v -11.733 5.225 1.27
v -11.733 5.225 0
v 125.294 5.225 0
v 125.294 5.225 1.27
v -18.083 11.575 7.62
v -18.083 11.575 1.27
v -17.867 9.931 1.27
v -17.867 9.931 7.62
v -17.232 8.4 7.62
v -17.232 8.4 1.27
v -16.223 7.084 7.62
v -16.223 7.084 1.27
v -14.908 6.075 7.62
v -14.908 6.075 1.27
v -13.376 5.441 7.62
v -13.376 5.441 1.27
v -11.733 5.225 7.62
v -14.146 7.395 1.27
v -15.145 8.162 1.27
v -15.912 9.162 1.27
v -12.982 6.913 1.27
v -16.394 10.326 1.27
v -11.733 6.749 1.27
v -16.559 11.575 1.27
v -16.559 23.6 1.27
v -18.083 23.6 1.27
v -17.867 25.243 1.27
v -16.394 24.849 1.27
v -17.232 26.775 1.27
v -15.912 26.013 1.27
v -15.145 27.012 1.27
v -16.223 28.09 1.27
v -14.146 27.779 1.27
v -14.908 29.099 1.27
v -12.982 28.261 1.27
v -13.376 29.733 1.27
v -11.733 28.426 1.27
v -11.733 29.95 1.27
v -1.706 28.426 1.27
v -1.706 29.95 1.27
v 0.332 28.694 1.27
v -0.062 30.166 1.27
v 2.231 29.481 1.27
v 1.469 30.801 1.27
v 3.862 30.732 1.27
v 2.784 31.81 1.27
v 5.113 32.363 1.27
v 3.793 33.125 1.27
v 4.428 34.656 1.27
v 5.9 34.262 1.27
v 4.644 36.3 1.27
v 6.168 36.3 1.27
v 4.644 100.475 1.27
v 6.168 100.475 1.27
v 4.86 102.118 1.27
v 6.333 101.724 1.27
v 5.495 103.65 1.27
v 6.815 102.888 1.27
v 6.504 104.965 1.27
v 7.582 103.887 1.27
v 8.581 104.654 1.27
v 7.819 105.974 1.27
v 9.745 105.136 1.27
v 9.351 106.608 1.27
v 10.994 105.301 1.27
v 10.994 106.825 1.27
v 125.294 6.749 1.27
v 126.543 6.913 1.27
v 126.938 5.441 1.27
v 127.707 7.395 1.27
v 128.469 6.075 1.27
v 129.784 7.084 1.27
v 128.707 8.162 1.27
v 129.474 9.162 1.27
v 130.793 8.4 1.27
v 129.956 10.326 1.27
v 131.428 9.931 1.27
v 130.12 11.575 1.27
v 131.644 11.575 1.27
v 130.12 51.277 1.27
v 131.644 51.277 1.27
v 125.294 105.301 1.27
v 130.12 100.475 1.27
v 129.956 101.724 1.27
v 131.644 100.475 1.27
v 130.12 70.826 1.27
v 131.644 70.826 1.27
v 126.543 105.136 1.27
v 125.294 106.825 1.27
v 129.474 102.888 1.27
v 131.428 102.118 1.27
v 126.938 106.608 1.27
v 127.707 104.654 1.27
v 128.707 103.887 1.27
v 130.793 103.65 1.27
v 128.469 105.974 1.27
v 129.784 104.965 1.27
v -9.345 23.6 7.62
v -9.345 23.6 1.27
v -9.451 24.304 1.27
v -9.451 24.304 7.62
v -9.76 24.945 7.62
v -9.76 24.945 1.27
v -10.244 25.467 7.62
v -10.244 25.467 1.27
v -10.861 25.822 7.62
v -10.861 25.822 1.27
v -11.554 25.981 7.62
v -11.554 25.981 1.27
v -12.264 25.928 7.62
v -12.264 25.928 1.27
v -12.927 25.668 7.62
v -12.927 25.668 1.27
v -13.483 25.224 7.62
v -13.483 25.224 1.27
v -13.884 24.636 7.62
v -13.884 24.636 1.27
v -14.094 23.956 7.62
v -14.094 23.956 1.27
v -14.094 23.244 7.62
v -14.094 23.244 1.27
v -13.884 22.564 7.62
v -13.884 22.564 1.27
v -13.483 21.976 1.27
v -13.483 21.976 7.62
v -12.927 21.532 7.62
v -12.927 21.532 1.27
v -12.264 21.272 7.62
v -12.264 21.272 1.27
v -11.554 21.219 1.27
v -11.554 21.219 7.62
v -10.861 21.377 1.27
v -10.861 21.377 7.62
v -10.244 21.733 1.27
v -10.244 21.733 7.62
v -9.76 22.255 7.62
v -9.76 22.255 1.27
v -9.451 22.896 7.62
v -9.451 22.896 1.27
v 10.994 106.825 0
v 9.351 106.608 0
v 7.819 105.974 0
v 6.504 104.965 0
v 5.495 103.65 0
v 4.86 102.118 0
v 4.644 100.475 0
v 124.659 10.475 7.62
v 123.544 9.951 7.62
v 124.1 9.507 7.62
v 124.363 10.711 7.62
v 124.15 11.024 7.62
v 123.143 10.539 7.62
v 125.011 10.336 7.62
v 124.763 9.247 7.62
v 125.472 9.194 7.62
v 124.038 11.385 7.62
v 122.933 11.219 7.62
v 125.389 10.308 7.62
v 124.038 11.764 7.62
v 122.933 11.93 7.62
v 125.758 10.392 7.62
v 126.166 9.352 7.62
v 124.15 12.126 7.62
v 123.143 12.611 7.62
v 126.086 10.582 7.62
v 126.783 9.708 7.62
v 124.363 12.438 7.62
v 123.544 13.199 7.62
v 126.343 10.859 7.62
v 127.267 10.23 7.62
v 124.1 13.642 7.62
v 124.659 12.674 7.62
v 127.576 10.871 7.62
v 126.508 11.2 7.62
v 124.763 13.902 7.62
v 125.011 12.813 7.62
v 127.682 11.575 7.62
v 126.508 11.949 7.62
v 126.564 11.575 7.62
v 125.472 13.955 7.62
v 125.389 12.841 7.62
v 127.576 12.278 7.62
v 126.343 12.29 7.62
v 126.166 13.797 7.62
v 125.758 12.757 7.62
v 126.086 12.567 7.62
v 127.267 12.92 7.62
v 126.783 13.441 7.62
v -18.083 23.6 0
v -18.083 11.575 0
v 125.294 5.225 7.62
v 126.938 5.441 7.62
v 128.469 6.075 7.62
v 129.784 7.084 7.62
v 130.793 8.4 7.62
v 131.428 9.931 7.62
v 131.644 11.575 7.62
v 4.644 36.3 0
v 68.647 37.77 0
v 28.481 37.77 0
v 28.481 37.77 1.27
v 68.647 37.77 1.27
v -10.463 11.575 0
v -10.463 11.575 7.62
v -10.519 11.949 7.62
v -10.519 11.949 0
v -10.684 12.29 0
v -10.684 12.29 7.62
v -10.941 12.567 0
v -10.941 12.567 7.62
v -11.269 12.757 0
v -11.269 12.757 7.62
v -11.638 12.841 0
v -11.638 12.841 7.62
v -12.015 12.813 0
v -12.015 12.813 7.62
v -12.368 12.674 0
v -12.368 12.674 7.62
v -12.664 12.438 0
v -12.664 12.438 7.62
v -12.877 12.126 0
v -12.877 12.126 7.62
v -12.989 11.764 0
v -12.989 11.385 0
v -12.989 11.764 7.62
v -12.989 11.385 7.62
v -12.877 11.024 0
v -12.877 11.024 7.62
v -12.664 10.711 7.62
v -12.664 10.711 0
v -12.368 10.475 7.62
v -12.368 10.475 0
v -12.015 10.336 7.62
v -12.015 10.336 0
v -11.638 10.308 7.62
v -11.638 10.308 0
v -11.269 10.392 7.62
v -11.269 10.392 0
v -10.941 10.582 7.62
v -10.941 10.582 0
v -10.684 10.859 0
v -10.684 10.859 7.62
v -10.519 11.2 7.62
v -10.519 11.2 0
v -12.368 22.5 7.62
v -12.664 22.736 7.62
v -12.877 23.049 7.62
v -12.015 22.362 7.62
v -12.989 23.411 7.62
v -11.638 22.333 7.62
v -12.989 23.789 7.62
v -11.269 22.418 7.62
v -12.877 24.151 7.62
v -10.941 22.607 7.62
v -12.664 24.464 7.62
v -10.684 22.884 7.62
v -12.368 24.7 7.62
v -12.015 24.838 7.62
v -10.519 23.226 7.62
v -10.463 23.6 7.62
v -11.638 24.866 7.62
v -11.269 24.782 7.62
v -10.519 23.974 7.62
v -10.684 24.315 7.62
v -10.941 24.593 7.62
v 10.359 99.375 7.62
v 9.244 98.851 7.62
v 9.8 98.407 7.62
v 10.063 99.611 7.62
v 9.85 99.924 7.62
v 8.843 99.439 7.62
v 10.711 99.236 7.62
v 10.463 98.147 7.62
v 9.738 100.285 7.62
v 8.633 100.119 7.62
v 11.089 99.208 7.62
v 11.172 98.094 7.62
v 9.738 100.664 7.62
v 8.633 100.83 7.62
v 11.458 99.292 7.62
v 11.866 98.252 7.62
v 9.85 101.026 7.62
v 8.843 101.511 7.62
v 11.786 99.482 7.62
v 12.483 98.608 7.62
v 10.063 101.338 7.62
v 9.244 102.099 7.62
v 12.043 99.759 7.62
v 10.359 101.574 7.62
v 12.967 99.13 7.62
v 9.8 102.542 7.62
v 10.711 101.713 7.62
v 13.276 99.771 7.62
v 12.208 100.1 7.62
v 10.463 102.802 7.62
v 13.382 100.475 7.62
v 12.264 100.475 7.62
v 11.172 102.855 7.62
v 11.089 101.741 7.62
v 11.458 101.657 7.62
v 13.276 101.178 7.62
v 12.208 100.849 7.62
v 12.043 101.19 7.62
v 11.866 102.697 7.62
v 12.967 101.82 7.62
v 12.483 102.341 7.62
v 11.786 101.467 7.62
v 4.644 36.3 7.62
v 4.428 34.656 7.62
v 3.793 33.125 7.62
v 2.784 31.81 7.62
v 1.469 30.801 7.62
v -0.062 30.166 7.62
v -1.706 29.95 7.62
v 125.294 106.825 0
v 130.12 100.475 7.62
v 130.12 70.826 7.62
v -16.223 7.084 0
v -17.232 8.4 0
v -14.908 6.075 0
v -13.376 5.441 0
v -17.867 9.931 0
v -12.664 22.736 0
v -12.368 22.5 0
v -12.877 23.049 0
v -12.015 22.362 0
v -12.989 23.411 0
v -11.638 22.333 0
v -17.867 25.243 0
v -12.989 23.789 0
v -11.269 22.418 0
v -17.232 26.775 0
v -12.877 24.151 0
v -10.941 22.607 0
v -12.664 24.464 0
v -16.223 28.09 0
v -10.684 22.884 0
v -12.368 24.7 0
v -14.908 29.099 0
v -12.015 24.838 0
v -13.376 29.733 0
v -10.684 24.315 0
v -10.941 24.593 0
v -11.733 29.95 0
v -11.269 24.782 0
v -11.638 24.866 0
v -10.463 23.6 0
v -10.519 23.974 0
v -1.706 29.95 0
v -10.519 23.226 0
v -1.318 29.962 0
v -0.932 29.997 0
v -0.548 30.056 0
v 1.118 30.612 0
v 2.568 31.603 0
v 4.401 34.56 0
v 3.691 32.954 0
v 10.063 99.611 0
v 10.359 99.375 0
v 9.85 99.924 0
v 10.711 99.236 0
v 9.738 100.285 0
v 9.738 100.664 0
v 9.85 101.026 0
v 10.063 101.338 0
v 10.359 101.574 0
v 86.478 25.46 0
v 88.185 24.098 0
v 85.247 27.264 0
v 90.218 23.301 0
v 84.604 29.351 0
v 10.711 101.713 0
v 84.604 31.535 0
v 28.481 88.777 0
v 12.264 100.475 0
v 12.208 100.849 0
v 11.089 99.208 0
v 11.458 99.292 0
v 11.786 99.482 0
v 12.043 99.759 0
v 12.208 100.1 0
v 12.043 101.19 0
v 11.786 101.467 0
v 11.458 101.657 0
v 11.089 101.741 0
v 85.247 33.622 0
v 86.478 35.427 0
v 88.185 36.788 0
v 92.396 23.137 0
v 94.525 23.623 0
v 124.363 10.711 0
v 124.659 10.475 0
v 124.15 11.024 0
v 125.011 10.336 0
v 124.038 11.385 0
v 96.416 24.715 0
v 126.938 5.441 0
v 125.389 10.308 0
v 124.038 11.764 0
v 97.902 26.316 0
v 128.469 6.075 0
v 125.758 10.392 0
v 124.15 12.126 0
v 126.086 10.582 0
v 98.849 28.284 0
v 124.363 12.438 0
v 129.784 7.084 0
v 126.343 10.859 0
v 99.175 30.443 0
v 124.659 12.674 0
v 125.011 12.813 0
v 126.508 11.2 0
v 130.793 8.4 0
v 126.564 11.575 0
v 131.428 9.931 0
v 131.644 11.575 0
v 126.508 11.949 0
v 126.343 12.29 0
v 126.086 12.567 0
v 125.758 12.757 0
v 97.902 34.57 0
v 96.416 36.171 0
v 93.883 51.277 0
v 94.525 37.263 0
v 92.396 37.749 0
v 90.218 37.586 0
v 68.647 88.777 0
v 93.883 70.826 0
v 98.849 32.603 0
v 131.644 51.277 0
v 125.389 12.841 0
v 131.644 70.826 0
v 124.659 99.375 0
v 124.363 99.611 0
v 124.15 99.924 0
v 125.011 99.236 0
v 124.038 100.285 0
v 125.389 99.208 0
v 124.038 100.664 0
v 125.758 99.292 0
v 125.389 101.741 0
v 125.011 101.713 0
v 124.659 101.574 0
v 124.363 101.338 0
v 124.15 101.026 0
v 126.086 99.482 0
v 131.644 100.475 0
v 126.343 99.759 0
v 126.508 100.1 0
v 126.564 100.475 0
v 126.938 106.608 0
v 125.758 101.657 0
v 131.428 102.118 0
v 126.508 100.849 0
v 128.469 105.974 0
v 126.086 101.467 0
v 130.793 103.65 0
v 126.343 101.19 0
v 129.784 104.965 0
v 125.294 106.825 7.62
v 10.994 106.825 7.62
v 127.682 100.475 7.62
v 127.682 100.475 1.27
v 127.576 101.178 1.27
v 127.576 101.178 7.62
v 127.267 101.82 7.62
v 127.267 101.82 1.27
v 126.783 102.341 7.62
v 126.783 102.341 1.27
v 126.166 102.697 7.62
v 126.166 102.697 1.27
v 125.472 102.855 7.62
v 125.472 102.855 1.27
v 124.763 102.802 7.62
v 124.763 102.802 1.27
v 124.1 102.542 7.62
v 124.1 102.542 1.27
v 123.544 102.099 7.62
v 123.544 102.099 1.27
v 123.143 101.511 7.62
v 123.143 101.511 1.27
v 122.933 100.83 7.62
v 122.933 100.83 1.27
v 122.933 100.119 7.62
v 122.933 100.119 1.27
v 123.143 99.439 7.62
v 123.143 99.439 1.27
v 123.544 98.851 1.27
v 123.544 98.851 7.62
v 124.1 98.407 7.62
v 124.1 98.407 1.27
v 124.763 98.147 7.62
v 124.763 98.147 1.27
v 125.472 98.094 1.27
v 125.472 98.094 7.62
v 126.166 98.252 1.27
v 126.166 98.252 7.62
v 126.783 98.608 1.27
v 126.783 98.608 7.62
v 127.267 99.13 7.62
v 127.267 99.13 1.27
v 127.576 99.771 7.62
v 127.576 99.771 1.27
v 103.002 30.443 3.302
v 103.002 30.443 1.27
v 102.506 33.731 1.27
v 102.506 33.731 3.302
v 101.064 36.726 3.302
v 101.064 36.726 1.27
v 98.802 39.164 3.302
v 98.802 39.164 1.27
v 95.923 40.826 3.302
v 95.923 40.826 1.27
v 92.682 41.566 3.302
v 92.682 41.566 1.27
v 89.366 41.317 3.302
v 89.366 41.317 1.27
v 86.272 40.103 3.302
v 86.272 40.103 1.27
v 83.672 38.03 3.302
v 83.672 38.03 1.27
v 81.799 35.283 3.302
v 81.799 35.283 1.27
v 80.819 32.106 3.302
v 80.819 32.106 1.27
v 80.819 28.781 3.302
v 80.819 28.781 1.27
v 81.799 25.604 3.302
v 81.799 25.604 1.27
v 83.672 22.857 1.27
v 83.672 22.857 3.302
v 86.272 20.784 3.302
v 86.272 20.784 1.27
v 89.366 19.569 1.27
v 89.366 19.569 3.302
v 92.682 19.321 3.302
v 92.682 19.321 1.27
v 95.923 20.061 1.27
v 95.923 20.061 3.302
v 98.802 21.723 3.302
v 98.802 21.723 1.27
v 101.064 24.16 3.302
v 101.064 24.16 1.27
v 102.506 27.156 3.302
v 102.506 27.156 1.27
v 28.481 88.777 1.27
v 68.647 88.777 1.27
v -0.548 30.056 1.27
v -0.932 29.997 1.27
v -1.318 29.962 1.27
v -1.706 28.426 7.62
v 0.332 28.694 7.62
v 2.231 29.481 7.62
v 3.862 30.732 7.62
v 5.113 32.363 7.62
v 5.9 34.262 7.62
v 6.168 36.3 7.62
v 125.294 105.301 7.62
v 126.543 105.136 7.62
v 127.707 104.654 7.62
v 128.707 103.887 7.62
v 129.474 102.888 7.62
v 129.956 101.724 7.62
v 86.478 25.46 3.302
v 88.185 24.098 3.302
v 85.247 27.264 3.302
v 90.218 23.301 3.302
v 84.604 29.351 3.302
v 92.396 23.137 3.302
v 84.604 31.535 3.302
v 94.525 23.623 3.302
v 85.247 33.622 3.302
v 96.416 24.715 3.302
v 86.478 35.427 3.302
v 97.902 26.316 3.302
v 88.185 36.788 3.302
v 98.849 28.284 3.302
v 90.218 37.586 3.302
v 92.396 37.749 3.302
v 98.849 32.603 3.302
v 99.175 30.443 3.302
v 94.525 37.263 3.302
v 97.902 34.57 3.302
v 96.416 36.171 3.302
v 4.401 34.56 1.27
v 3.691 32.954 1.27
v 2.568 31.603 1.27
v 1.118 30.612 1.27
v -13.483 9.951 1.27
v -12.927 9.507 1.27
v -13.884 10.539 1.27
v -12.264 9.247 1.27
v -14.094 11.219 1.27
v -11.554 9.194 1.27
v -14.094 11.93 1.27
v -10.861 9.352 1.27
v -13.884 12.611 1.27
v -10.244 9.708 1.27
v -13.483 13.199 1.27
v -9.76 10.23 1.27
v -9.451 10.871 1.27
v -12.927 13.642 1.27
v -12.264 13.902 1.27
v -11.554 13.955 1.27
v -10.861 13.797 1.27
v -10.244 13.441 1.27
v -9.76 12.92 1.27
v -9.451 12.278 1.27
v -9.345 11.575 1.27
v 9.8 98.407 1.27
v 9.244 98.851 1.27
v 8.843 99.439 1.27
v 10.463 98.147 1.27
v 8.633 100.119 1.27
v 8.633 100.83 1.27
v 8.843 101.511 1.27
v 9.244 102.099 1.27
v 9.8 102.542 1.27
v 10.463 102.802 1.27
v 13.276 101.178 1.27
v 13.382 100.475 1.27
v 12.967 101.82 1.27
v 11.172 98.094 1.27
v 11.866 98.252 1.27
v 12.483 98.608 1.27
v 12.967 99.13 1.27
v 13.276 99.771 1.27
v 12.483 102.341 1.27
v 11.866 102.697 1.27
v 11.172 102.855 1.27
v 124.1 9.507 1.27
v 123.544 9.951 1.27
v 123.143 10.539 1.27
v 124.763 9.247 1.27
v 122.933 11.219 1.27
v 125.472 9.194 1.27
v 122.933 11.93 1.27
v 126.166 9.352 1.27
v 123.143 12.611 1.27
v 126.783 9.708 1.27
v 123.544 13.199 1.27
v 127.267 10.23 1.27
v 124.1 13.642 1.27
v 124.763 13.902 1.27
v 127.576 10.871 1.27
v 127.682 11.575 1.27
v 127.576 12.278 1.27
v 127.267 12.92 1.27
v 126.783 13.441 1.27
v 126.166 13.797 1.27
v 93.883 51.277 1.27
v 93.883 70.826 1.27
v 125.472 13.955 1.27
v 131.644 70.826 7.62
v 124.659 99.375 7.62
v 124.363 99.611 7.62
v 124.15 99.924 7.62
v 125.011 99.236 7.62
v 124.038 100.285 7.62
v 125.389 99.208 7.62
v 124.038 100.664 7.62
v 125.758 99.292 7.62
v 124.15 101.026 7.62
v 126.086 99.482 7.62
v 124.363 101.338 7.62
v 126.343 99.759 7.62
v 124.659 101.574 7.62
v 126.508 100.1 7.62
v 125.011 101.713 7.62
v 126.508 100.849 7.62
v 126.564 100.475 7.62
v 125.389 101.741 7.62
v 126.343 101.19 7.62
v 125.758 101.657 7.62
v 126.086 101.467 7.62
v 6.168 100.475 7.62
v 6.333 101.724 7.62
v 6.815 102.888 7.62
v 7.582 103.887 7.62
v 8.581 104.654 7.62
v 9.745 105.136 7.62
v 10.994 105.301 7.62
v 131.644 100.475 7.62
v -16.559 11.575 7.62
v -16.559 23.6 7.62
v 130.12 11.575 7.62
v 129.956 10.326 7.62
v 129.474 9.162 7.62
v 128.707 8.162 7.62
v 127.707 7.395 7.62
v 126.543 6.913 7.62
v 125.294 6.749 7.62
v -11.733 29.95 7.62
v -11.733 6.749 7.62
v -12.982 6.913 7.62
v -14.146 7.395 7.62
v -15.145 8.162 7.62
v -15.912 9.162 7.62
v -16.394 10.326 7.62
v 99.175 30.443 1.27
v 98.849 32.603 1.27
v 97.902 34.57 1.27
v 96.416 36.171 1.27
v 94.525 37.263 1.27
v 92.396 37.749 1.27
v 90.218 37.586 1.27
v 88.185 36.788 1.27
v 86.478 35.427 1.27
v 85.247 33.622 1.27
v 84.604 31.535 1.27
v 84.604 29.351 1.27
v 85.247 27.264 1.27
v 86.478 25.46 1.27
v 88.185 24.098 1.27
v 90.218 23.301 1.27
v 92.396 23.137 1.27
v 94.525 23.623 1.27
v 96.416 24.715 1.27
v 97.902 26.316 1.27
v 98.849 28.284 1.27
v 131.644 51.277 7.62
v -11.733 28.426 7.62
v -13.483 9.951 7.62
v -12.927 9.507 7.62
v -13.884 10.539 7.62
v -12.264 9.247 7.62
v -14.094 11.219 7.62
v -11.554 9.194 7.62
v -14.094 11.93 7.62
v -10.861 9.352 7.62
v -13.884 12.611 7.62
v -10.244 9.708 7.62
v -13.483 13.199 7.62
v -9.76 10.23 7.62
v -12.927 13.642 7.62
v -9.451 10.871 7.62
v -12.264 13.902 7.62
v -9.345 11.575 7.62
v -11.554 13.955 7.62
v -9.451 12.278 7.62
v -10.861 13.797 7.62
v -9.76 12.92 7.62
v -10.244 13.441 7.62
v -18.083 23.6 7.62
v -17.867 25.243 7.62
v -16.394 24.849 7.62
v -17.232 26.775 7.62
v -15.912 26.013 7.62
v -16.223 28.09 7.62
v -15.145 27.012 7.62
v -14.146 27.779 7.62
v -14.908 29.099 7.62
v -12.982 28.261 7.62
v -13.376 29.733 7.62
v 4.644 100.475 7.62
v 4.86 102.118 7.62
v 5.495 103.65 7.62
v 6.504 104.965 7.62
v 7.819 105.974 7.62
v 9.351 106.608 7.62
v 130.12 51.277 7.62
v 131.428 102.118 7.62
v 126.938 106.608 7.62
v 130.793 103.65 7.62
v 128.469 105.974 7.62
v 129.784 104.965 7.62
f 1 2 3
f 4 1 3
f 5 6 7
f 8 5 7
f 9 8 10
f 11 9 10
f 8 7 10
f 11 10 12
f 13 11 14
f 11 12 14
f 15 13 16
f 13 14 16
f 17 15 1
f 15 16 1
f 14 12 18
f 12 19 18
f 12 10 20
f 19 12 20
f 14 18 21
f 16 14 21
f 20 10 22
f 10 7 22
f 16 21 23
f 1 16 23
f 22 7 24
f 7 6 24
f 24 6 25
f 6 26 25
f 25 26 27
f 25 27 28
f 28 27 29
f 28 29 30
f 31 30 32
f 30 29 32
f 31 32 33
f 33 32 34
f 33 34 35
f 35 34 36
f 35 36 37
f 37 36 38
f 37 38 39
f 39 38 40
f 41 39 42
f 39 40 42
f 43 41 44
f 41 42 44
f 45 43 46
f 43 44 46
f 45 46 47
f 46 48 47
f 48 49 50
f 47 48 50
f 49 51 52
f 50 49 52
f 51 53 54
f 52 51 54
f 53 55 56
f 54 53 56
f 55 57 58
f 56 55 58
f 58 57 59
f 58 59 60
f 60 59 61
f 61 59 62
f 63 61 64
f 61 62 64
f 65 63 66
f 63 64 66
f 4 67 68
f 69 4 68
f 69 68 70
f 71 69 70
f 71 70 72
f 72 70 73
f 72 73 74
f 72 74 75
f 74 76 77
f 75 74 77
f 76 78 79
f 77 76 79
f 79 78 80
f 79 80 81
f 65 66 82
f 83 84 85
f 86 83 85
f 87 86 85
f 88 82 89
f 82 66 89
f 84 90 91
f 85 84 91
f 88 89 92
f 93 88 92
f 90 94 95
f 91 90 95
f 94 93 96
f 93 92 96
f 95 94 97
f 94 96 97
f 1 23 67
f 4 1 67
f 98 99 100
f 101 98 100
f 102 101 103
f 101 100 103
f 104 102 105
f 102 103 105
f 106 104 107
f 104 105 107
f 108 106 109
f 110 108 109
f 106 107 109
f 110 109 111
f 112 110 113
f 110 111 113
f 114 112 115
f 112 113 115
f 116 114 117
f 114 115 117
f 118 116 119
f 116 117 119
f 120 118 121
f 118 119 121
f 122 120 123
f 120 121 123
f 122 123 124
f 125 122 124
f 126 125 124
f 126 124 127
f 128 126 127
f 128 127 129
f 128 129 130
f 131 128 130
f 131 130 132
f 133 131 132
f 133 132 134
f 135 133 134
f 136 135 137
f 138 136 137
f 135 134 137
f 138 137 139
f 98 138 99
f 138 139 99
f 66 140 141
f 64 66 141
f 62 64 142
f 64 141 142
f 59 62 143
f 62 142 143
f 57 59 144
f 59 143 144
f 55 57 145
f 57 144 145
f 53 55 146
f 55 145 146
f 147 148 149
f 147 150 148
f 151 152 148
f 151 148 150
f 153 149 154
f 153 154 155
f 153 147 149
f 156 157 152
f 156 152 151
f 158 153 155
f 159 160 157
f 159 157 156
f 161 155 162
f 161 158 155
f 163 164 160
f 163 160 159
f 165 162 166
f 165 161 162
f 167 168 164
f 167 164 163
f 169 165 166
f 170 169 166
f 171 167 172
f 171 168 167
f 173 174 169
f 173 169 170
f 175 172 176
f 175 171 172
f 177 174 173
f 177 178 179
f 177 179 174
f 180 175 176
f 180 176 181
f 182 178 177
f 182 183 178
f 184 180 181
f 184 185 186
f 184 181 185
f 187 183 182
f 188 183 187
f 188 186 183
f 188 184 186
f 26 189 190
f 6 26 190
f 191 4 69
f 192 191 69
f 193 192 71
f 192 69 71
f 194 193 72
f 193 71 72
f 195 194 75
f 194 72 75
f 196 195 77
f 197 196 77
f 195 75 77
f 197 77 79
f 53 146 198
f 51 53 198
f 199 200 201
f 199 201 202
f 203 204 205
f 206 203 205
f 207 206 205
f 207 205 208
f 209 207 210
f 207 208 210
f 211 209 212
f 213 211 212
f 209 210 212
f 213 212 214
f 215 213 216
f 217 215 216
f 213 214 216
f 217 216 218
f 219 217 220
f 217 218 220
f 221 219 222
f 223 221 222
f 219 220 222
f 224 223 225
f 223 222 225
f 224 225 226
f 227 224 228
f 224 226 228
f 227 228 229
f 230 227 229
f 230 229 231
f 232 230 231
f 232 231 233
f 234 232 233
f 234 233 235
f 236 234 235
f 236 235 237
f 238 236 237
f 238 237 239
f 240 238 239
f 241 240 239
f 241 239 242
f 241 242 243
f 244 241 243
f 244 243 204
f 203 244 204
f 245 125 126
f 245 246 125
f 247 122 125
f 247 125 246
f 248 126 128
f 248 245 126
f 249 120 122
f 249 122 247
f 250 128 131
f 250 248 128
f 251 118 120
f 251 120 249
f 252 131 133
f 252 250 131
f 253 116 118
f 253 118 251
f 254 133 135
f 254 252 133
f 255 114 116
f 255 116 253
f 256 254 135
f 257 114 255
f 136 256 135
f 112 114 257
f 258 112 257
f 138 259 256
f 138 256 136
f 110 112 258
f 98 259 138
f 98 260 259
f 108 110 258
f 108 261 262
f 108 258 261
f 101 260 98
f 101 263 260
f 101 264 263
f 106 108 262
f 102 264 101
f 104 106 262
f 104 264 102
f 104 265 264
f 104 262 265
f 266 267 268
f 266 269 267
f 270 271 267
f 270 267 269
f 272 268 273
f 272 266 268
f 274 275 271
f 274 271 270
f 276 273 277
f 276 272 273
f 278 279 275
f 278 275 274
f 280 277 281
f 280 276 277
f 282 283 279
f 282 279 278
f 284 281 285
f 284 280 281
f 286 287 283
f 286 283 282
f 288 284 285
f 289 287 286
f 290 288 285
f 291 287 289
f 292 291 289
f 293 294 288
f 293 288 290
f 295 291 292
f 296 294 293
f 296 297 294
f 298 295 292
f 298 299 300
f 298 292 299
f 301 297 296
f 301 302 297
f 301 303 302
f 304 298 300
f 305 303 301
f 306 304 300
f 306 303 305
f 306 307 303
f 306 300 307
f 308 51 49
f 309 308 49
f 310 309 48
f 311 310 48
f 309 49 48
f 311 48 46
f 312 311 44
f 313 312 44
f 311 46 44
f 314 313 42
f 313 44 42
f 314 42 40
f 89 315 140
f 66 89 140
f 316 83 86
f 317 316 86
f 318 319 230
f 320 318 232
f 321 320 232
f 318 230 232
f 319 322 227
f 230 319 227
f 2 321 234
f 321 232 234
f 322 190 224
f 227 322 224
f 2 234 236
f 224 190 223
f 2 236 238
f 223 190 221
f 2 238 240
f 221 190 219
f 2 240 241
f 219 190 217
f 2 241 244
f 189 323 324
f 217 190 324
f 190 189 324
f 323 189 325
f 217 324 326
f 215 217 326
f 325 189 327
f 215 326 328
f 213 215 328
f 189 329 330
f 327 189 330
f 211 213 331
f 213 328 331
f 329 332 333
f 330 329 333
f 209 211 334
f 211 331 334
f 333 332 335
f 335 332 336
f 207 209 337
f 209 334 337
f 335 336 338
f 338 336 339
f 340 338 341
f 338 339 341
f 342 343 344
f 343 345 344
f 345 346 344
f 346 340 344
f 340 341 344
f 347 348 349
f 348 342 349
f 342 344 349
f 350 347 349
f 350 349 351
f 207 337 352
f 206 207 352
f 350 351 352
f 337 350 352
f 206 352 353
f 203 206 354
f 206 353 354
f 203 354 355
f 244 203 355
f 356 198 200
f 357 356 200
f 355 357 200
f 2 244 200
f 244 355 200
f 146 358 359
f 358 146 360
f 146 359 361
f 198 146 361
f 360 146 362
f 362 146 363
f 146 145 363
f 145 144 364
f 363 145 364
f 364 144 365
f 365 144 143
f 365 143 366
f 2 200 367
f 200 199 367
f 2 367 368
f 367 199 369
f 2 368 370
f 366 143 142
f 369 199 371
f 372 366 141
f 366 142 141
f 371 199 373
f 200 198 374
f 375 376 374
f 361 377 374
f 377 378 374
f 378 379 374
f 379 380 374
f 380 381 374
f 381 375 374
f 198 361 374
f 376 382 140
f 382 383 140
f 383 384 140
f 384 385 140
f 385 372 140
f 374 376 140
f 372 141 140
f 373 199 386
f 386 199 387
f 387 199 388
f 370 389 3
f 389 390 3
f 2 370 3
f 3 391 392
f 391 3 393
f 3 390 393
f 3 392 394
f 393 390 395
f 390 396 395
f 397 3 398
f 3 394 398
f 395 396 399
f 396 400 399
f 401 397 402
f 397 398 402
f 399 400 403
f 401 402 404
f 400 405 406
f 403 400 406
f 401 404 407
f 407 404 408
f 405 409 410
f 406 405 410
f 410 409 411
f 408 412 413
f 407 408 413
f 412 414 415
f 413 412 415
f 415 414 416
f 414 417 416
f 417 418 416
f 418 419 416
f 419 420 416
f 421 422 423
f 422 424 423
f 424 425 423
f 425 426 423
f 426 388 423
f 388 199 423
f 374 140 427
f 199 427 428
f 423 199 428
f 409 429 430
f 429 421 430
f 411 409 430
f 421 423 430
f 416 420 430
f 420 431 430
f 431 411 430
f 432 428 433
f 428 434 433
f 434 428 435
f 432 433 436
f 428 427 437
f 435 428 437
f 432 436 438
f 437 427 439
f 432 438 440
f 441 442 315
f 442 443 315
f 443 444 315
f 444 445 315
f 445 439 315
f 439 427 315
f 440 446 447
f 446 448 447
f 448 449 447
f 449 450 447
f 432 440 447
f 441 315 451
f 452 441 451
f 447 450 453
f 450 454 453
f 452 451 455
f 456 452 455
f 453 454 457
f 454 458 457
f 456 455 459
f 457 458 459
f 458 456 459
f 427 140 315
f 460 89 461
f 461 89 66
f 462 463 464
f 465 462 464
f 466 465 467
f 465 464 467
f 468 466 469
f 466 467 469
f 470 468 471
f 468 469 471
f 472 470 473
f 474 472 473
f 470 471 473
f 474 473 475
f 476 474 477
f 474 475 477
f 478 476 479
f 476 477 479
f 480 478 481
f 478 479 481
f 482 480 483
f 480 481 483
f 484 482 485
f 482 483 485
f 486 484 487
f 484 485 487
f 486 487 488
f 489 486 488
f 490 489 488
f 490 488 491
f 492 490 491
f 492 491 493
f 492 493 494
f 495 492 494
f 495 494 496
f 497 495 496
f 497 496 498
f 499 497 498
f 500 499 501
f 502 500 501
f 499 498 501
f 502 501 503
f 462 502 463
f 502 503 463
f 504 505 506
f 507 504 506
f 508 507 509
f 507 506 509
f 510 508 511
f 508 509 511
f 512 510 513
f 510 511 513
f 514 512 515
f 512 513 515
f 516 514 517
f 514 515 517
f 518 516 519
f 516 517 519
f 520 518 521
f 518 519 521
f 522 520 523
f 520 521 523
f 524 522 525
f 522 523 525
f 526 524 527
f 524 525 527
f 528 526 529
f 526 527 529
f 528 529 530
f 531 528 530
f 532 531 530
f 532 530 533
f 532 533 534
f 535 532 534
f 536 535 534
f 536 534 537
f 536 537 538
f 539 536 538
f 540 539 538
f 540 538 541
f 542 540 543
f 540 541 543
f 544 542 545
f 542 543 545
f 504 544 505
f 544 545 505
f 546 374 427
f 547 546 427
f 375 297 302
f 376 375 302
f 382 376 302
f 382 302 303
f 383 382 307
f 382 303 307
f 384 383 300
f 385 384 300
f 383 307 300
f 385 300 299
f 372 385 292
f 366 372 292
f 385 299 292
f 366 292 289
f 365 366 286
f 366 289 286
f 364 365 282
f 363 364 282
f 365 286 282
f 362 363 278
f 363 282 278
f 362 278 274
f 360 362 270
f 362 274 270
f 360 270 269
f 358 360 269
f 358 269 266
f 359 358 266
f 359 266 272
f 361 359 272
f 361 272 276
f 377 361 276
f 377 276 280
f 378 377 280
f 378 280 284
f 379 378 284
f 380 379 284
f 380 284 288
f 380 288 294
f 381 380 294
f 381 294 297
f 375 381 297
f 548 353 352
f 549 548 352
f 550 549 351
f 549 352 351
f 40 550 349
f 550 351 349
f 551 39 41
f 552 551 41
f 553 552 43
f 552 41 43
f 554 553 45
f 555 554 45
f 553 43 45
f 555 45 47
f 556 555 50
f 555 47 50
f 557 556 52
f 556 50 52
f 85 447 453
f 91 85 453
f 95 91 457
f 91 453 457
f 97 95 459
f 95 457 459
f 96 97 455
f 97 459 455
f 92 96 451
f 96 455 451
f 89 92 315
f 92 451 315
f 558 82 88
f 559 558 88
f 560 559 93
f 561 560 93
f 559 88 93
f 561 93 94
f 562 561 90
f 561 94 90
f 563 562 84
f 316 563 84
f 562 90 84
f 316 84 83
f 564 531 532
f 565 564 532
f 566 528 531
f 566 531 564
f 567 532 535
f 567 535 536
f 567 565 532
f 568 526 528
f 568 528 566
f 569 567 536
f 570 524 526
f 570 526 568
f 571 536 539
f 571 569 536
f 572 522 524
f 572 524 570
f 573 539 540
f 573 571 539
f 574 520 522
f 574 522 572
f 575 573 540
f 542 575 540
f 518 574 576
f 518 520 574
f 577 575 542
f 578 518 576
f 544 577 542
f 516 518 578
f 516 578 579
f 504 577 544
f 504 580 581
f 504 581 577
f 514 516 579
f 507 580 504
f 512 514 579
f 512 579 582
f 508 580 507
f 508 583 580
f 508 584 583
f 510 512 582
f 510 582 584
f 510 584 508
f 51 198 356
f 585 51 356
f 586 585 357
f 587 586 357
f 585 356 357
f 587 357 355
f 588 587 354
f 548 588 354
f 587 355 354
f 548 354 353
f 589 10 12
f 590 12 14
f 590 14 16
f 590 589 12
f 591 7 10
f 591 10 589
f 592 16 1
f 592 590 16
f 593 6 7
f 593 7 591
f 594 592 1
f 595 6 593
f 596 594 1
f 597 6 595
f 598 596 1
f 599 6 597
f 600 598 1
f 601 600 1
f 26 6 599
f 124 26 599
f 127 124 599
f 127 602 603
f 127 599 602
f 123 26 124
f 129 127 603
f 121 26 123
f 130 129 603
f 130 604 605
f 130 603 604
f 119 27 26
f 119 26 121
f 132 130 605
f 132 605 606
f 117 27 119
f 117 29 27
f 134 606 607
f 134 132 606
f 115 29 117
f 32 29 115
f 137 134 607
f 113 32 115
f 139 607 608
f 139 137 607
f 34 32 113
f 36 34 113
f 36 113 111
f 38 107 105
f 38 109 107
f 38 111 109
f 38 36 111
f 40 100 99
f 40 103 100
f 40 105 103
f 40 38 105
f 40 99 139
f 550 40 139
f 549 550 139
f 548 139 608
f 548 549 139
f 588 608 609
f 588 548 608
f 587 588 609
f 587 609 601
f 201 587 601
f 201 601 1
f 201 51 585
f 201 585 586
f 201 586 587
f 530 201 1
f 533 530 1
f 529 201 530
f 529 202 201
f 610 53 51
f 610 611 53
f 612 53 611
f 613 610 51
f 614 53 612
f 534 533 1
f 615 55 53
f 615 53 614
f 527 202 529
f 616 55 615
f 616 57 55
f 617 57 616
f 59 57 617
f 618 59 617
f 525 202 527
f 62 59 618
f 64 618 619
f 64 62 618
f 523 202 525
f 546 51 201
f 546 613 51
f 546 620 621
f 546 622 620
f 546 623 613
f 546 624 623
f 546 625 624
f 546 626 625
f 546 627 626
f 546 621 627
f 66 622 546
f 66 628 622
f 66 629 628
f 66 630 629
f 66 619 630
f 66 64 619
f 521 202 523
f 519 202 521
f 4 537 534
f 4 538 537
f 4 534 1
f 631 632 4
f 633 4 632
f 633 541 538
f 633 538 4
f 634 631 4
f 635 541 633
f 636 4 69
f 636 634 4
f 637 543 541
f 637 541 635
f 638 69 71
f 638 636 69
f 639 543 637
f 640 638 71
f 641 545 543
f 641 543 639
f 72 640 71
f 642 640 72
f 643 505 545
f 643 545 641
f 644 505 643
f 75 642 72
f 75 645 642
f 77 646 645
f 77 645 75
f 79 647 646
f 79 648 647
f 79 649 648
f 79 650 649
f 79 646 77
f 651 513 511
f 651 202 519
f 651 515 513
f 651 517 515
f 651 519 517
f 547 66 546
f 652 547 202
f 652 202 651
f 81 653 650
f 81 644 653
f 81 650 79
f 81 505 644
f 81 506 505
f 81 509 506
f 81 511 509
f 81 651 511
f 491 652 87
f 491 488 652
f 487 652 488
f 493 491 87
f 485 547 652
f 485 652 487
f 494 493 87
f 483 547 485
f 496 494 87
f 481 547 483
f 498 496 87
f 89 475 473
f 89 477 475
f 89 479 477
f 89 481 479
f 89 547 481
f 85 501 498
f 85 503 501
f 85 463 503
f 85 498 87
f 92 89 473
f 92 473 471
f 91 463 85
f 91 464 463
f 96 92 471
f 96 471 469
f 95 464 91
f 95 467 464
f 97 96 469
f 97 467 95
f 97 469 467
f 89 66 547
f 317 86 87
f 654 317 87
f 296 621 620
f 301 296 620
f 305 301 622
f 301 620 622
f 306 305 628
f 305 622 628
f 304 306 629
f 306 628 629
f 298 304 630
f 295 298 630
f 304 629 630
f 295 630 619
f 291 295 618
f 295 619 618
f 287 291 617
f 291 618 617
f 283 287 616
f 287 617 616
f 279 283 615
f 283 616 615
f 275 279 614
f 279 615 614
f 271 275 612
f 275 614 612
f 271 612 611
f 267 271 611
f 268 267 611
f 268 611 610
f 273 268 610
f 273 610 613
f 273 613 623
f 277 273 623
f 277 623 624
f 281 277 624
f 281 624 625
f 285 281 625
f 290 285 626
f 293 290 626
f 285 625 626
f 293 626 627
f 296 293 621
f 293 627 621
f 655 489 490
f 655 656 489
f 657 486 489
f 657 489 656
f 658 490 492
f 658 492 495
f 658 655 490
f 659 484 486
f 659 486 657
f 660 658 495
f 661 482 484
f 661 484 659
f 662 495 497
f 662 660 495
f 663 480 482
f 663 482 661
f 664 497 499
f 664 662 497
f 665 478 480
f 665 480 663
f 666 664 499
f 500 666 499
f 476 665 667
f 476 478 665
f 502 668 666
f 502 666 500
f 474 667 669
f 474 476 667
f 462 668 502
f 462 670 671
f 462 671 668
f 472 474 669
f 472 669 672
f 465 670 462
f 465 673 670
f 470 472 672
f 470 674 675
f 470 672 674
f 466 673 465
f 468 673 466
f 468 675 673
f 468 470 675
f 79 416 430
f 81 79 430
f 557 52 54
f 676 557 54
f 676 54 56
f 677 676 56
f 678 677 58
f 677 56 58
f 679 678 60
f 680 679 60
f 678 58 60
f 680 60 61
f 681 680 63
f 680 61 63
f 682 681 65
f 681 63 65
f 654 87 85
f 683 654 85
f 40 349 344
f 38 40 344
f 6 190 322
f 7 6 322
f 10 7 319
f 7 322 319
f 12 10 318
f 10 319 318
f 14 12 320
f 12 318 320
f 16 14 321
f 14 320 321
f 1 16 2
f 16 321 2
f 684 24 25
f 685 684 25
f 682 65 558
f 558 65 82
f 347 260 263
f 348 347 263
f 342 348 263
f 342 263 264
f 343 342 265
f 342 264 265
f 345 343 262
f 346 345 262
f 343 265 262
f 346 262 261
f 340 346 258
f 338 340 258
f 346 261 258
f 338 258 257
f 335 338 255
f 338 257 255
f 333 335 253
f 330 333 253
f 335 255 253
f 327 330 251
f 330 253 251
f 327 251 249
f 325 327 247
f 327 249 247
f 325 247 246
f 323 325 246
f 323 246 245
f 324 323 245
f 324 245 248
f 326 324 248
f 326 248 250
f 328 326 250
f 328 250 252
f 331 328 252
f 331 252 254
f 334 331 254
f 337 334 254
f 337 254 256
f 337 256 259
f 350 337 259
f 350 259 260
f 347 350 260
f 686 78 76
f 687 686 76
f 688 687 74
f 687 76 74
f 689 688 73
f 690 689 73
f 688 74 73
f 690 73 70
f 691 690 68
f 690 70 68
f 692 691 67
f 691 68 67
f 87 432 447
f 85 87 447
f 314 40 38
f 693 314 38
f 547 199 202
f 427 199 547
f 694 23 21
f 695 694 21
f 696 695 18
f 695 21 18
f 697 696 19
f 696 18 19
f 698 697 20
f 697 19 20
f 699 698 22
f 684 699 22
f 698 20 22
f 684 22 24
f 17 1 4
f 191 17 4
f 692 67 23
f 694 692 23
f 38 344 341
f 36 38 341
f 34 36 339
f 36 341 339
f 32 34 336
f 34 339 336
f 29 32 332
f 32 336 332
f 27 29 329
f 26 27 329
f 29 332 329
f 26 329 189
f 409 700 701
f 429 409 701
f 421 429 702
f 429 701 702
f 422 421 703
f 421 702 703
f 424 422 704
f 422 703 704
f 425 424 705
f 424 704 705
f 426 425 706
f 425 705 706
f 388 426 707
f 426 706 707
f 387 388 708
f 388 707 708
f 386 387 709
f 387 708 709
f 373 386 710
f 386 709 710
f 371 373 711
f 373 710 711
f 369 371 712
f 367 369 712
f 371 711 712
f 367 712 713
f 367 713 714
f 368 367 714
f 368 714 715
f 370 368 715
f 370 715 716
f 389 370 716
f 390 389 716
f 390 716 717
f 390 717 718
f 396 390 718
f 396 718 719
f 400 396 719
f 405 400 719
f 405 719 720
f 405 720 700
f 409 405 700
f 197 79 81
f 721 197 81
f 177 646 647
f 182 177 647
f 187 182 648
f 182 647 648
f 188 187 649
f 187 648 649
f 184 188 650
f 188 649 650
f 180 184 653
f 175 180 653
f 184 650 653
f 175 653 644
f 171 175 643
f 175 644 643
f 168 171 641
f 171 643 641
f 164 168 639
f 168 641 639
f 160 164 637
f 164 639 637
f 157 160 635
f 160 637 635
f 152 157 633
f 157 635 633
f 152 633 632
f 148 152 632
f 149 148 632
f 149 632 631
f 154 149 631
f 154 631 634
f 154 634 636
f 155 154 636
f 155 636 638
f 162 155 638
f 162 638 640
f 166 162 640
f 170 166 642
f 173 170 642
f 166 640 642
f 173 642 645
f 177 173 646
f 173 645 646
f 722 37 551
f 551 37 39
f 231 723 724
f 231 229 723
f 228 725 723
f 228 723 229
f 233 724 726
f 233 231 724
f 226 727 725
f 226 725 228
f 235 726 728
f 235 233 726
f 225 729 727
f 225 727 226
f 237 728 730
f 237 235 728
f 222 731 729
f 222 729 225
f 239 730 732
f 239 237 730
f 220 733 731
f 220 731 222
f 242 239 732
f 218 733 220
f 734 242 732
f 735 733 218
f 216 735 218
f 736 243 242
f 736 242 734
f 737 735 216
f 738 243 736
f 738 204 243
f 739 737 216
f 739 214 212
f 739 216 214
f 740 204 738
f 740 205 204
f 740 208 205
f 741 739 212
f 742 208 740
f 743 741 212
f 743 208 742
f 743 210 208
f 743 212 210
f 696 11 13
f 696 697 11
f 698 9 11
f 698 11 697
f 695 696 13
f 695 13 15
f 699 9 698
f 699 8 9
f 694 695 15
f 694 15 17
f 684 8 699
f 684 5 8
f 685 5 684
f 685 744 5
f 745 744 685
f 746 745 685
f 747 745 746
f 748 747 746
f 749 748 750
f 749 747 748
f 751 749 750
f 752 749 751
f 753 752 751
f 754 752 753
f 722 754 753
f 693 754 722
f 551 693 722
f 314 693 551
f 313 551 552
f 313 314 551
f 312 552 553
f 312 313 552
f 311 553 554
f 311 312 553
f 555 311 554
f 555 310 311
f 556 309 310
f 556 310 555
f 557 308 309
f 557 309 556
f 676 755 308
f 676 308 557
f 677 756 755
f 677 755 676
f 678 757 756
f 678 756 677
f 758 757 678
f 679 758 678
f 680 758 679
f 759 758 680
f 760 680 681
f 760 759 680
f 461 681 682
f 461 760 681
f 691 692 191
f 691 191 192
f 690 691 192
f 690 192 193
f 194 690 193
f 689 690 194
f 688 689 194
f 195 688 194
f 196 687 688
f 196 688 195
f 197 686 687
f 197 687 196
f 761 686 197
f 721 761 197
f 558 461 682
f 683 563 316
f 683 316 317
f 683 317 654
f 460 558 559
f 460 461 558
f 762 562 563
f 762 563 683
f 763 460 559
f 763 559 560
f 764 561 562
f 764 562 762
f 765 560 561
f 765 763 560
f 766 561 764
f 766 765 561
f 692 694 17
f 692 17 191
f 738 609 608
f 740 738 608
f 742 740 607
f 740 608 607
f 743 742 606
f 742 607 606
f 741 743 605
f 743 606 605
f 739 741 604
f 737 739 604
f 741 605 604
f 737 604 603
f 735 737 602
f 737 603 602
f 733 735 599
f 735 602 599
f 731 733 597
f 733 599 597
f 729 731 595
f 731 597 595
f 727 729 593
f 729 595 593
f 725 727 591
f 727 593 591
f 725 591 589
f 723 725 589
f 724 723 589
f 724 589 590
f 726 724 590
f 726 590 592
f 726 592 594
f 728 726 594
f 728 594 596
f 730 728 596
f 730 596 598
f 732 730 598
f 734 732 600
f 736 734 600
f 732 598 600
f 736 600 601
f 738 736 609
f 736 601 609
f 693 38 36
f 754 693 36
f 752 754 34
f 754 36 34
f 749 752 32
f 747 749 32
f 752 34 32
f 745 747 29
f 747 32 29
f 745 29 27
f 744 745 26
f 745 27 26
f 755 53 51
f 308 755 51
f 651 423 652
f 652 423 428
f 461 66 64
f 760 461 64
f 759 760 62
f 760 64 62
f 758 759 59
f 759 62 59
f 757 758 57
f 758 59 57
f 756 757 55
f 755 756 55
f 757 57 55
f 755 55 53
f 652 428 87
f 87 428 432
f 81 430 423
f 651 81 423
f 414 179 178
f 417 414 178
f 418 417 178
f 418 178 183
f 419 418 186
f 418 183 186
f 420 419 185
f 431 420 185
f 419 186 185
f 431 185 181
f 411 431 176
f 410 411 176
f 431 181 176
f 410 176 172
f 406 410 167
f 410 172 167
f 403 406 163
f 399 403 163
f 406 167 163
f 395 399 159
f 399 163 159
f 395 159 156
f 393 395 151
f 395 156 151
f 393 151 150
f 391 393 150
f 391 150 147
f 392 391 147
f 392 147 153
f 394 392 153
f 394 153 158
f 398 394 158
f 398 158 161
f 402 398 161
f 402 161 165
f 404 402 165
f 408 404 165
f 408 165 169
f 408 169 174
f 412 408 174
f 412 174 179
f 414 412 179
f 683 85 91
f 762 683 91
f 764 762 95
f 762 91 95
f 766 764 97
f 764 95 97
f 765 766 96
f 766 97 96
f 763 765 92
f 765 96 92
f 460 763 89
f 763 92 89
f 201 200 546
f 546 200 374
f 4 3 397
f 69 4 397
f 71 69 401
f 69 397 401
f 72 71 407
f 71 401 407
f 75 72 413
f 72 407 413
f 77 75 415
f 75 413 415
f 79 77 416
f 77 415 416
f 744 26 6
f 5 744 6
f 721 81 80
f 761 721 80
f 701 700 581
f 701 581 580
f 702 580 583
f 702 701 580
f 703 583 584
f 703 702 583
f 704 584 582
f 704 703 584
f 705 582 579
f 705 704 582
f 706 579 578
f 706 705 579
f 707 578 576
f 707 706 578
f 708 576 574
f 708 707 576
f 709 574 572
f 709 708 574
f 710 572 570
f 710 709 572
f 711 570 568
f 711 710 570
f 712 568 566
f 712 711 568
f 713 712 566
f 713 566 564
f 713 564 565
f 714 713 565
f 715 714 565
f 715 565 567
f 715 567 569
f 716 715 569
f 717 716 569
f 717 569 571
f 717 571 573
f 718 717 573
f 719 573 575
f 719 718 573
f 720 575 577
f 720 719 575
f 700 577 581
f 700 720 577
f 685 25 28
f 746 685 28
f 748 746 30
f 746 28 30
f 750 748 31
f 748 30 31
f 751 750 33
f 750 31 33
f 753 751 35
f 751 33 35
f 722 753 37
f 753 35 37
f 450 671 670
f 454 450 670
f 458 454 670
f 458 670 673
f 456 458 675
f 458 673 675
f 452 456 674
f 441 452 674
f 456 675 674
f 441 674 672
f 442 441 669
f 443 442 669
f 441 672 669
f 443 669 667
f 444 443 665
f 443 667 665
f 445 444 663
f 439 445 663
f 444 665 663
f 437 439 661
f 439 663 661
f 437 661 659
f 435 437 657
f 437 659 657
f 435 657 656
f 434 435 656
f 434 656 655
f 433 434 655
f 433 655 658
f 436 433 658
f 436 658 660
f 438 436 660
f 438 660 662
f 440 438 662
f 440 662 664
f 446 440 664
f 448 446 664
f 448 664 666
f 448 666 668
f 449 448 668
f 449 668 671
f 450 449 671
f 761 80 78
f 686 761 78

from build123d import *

# Parameters (mm, degrees)
F0_W      = 40.165698
F0_H      = 51.006884
F1_DEPTH  = 1.27
F3_DEPTH  = 6.35
F4_R      = 2.3876
F5_DEPTH  = 6.35
F6_R      = 1.27
F7_DEPTH  = 7.621
F8_R      = 11.153623
F8_R_2    = 7.326428
F9_DEPTH  = 2.032
F10_R     = 7.326428
F11_DEPTH = 1.271


with BuildPart() as f1:
    # F0 (on Top) → F1 (new body)
    with BuildSketch(Plane.XY):
        with BuildLine():
            Line((-11.732876, 5.224568), (4.644063, 5.224568))
            Line((4.644063, 5.224568), (125.294063, 5.224568))
            ThreePointArc((125.294063, 5.224568), (129.784191, 7.08444), (131.644063, 11.574568))
            Line((131.644063, 11.574568), (131.644063, 51.276788))
            Line((131.644063, 51.276788), (93.883455, 51.276788))
            Line((93.883455, 51.276788), (93.883455, 70.826463))
            Line((93.883455, 70.826463), (131.644063, 70.826463))
            Line((131.644063, 70.826463), (131.644063, 100.474568))
            ThreePointArc((131.644063, 100.474568), (129.784191, 104.964696), (125.294063, 106.824568))
            Line((125.294063, 106.824568), (10.994063, 106.824568))
            ThreePointArc((10.994063, 106.824568), (6.503935, 104.964696), (4.644063, 100.474568))
            Line((4.644063, 100.474568), (4.644063, 36.29987))
            ThreePointArc((4.644063, 36.29987), (3.176333, 32.239581), (-0.54836, 30.056272))
            ThreePointArc((-0.54836, 30.056272), (-1.124708, 29.976526), (-1.705937, 29.94987))
            Line((-1.705937, 29.94987), (-11.732876, 29.94987))
            ThreePointArc((-11.732876, 29.94987), (-16.223004, 28.089998), (-18.082876, 23.59987))
            Line((-18.082876, 23.59987), (-18.082876, 11.574568))
            ThreePointArc((-18.082876, 11.574568), (-16.223004, 7.08444), (-11.732876, 5.224568))
        make_face()
        with Locations((48.563746, 63.273184)):
            Rectangle(F0_W, F0_H, mode=Mode.SUBTRACT)
    extrude(amount=F1_DEPTH)

    # F4 (on face) → F5 (join)
    with BuildSketch(Plane.XY.offset(1.27)):
        with Locations((10.994063, 100.474568)):
            Circle(F4_R)
        with Locations((125.294063, 100.474568)):
            Circle(F4_R)
        with Locations((125.294063, 11.574568)):
            Circle(F4_R)
        with Locations((-11.732876, 23.59987)):
            Circle(F4_R)
        with Locations((-11.732876, 11.574568)):
            Circle(F4_R)
    extrude(amount=F5_DEPTH)

    # F6 (on face) → F7 (cut, through all)
    with BuildSketch(Plane.XY.offset(7.62)):
        with Locations((10.994063, 100.474568)):
            Circle(F6_R)
        with Locations((-11.732876, 23.59987)):
            Circle(F6_R)
        with Locations((-11.732876, 11.574568)):
            Circle(F6_R)
        with Locations((125.294063, 11.574568)):
            Circle(F6_R)
        with Locations((125.294063, 100.474568)):
            Circle(F6_R)
    extrude(amount=-F7_DEPTH, mode=Mode.SUBTRACT)

    # F8 (on face) → F9 (join)
    with BuildSketch(Plane.XY.offset(1.27)):
        with Locations((91.848329, 30.443314)):
            Circle(F8_R)
        with Locations((91.848329, 30.443314)):
            Circle(F8_R_2, mode=Mode.SUBTRACT)
    extrude(amount=F9_DEPTH)

    # F10 (on face) → F11 (cut, through all)
    with BuildSketch(Plane.XY.offset(1.27)):
        with Locations((91.848329, 30.443314)):
            Circle(F10_R)
    extrude(amount=-F11_DEPTH, mode=Mode.SUBTRACT)


with BuildPart() as f3:
    # F2 (on face) → F3 (new body)
    with BuildSketch(Plane.XY.offset(1.27)):
        with BuildLine():
            Line((130.120063, 51.276788), (130.120063, 11.574568))
            ThreePointArc((130.120063, 11.574568), (128.706561, 8.162071), (125.294063, 6.748568))
            Line((125.294063, 6.748568), (-11.732876, 6.748568))
            ThreePointArc((-11.732876, 6.748568), (-15.145373, 8.162071), (-16.558876, 11.574568))
            Line((-16.558876, 11.574568), (-16.558876, 23.59987))
            ThreePointArc((-16.558876, 23.59987), (-15.145373, 27.012367), (-11.732876, 28.42587))
            Line((-11.732876, 28.42587), (-1.705937, 28.42587))
            ThreePointArc((-1.705937, 28.42587), (3.861822, 30.732111), (6.168063, 36.29987))
            Line((6.168063, 36.29987), (6.168063, 100.474568))
            ThreePointArc((6.168063, 100.474568), (7.581566, 103.887066), (10.994063, 105.300568))
            Line((10.994063, 105.300568), (125.294063, 105.300568))
            ThreePointArc((125.294063, 105.300568), (128.706561, 103.887066), (130.120063, 100.474568))
            Line((130.120063, 100.474568), (130.120063, 70.826463))
            Line((130.120063, 70.826463), (131.644063, 70.826463))
            Line((131.644063, 70.826463), (131.644063, 100.474568))
            ThreePointArc((131.644063, 100.474568), (129.784191, 104.964696), (125.294063, 106.824568))
            Line((125.294063, 106.824568), (10.994063, 106.824568))
            ThreePointArc((10.994063, 106.824568), (6.503935, 104.964696), (4.644063, 100.474568))
            Line((4.644063, 100.474568), (4.644063, 36.29987))
            ThreePointArc((4.644063, 36.29987), (2.784191, 31.809742), (-1.705937, 29.94987))
            Line((-1.705937, 29.94987), (-11.732876, 29.94987))
            ThreePointArc((-11.732876, 29.94987), (-16.223004, 28.089998), (-18.082876, 23.59987))
            Line((-18.082876, 23.59987), (-18.082876, 11.574568))
            ThreePointArc((-18.082876, 11.574568), (-16.223004, 7.08444), (-11.732876, 5.224568))
            Line((-11.732876, 5.224568), (125.294063, 5.224568))
            ThreePointArc((125.294063, 5.224568), (129.784191, 7.08444), (131.644063, 11.574568))
            Line((131.644063, 11.574568), (131.644063, 51.276788))
            Line((131.644063, 51.276788), (130.120063, 51.276788))
        make_face()
    extrude(amount=F3_DEPTH)


solid = Compound([f1.part, f3.part])
